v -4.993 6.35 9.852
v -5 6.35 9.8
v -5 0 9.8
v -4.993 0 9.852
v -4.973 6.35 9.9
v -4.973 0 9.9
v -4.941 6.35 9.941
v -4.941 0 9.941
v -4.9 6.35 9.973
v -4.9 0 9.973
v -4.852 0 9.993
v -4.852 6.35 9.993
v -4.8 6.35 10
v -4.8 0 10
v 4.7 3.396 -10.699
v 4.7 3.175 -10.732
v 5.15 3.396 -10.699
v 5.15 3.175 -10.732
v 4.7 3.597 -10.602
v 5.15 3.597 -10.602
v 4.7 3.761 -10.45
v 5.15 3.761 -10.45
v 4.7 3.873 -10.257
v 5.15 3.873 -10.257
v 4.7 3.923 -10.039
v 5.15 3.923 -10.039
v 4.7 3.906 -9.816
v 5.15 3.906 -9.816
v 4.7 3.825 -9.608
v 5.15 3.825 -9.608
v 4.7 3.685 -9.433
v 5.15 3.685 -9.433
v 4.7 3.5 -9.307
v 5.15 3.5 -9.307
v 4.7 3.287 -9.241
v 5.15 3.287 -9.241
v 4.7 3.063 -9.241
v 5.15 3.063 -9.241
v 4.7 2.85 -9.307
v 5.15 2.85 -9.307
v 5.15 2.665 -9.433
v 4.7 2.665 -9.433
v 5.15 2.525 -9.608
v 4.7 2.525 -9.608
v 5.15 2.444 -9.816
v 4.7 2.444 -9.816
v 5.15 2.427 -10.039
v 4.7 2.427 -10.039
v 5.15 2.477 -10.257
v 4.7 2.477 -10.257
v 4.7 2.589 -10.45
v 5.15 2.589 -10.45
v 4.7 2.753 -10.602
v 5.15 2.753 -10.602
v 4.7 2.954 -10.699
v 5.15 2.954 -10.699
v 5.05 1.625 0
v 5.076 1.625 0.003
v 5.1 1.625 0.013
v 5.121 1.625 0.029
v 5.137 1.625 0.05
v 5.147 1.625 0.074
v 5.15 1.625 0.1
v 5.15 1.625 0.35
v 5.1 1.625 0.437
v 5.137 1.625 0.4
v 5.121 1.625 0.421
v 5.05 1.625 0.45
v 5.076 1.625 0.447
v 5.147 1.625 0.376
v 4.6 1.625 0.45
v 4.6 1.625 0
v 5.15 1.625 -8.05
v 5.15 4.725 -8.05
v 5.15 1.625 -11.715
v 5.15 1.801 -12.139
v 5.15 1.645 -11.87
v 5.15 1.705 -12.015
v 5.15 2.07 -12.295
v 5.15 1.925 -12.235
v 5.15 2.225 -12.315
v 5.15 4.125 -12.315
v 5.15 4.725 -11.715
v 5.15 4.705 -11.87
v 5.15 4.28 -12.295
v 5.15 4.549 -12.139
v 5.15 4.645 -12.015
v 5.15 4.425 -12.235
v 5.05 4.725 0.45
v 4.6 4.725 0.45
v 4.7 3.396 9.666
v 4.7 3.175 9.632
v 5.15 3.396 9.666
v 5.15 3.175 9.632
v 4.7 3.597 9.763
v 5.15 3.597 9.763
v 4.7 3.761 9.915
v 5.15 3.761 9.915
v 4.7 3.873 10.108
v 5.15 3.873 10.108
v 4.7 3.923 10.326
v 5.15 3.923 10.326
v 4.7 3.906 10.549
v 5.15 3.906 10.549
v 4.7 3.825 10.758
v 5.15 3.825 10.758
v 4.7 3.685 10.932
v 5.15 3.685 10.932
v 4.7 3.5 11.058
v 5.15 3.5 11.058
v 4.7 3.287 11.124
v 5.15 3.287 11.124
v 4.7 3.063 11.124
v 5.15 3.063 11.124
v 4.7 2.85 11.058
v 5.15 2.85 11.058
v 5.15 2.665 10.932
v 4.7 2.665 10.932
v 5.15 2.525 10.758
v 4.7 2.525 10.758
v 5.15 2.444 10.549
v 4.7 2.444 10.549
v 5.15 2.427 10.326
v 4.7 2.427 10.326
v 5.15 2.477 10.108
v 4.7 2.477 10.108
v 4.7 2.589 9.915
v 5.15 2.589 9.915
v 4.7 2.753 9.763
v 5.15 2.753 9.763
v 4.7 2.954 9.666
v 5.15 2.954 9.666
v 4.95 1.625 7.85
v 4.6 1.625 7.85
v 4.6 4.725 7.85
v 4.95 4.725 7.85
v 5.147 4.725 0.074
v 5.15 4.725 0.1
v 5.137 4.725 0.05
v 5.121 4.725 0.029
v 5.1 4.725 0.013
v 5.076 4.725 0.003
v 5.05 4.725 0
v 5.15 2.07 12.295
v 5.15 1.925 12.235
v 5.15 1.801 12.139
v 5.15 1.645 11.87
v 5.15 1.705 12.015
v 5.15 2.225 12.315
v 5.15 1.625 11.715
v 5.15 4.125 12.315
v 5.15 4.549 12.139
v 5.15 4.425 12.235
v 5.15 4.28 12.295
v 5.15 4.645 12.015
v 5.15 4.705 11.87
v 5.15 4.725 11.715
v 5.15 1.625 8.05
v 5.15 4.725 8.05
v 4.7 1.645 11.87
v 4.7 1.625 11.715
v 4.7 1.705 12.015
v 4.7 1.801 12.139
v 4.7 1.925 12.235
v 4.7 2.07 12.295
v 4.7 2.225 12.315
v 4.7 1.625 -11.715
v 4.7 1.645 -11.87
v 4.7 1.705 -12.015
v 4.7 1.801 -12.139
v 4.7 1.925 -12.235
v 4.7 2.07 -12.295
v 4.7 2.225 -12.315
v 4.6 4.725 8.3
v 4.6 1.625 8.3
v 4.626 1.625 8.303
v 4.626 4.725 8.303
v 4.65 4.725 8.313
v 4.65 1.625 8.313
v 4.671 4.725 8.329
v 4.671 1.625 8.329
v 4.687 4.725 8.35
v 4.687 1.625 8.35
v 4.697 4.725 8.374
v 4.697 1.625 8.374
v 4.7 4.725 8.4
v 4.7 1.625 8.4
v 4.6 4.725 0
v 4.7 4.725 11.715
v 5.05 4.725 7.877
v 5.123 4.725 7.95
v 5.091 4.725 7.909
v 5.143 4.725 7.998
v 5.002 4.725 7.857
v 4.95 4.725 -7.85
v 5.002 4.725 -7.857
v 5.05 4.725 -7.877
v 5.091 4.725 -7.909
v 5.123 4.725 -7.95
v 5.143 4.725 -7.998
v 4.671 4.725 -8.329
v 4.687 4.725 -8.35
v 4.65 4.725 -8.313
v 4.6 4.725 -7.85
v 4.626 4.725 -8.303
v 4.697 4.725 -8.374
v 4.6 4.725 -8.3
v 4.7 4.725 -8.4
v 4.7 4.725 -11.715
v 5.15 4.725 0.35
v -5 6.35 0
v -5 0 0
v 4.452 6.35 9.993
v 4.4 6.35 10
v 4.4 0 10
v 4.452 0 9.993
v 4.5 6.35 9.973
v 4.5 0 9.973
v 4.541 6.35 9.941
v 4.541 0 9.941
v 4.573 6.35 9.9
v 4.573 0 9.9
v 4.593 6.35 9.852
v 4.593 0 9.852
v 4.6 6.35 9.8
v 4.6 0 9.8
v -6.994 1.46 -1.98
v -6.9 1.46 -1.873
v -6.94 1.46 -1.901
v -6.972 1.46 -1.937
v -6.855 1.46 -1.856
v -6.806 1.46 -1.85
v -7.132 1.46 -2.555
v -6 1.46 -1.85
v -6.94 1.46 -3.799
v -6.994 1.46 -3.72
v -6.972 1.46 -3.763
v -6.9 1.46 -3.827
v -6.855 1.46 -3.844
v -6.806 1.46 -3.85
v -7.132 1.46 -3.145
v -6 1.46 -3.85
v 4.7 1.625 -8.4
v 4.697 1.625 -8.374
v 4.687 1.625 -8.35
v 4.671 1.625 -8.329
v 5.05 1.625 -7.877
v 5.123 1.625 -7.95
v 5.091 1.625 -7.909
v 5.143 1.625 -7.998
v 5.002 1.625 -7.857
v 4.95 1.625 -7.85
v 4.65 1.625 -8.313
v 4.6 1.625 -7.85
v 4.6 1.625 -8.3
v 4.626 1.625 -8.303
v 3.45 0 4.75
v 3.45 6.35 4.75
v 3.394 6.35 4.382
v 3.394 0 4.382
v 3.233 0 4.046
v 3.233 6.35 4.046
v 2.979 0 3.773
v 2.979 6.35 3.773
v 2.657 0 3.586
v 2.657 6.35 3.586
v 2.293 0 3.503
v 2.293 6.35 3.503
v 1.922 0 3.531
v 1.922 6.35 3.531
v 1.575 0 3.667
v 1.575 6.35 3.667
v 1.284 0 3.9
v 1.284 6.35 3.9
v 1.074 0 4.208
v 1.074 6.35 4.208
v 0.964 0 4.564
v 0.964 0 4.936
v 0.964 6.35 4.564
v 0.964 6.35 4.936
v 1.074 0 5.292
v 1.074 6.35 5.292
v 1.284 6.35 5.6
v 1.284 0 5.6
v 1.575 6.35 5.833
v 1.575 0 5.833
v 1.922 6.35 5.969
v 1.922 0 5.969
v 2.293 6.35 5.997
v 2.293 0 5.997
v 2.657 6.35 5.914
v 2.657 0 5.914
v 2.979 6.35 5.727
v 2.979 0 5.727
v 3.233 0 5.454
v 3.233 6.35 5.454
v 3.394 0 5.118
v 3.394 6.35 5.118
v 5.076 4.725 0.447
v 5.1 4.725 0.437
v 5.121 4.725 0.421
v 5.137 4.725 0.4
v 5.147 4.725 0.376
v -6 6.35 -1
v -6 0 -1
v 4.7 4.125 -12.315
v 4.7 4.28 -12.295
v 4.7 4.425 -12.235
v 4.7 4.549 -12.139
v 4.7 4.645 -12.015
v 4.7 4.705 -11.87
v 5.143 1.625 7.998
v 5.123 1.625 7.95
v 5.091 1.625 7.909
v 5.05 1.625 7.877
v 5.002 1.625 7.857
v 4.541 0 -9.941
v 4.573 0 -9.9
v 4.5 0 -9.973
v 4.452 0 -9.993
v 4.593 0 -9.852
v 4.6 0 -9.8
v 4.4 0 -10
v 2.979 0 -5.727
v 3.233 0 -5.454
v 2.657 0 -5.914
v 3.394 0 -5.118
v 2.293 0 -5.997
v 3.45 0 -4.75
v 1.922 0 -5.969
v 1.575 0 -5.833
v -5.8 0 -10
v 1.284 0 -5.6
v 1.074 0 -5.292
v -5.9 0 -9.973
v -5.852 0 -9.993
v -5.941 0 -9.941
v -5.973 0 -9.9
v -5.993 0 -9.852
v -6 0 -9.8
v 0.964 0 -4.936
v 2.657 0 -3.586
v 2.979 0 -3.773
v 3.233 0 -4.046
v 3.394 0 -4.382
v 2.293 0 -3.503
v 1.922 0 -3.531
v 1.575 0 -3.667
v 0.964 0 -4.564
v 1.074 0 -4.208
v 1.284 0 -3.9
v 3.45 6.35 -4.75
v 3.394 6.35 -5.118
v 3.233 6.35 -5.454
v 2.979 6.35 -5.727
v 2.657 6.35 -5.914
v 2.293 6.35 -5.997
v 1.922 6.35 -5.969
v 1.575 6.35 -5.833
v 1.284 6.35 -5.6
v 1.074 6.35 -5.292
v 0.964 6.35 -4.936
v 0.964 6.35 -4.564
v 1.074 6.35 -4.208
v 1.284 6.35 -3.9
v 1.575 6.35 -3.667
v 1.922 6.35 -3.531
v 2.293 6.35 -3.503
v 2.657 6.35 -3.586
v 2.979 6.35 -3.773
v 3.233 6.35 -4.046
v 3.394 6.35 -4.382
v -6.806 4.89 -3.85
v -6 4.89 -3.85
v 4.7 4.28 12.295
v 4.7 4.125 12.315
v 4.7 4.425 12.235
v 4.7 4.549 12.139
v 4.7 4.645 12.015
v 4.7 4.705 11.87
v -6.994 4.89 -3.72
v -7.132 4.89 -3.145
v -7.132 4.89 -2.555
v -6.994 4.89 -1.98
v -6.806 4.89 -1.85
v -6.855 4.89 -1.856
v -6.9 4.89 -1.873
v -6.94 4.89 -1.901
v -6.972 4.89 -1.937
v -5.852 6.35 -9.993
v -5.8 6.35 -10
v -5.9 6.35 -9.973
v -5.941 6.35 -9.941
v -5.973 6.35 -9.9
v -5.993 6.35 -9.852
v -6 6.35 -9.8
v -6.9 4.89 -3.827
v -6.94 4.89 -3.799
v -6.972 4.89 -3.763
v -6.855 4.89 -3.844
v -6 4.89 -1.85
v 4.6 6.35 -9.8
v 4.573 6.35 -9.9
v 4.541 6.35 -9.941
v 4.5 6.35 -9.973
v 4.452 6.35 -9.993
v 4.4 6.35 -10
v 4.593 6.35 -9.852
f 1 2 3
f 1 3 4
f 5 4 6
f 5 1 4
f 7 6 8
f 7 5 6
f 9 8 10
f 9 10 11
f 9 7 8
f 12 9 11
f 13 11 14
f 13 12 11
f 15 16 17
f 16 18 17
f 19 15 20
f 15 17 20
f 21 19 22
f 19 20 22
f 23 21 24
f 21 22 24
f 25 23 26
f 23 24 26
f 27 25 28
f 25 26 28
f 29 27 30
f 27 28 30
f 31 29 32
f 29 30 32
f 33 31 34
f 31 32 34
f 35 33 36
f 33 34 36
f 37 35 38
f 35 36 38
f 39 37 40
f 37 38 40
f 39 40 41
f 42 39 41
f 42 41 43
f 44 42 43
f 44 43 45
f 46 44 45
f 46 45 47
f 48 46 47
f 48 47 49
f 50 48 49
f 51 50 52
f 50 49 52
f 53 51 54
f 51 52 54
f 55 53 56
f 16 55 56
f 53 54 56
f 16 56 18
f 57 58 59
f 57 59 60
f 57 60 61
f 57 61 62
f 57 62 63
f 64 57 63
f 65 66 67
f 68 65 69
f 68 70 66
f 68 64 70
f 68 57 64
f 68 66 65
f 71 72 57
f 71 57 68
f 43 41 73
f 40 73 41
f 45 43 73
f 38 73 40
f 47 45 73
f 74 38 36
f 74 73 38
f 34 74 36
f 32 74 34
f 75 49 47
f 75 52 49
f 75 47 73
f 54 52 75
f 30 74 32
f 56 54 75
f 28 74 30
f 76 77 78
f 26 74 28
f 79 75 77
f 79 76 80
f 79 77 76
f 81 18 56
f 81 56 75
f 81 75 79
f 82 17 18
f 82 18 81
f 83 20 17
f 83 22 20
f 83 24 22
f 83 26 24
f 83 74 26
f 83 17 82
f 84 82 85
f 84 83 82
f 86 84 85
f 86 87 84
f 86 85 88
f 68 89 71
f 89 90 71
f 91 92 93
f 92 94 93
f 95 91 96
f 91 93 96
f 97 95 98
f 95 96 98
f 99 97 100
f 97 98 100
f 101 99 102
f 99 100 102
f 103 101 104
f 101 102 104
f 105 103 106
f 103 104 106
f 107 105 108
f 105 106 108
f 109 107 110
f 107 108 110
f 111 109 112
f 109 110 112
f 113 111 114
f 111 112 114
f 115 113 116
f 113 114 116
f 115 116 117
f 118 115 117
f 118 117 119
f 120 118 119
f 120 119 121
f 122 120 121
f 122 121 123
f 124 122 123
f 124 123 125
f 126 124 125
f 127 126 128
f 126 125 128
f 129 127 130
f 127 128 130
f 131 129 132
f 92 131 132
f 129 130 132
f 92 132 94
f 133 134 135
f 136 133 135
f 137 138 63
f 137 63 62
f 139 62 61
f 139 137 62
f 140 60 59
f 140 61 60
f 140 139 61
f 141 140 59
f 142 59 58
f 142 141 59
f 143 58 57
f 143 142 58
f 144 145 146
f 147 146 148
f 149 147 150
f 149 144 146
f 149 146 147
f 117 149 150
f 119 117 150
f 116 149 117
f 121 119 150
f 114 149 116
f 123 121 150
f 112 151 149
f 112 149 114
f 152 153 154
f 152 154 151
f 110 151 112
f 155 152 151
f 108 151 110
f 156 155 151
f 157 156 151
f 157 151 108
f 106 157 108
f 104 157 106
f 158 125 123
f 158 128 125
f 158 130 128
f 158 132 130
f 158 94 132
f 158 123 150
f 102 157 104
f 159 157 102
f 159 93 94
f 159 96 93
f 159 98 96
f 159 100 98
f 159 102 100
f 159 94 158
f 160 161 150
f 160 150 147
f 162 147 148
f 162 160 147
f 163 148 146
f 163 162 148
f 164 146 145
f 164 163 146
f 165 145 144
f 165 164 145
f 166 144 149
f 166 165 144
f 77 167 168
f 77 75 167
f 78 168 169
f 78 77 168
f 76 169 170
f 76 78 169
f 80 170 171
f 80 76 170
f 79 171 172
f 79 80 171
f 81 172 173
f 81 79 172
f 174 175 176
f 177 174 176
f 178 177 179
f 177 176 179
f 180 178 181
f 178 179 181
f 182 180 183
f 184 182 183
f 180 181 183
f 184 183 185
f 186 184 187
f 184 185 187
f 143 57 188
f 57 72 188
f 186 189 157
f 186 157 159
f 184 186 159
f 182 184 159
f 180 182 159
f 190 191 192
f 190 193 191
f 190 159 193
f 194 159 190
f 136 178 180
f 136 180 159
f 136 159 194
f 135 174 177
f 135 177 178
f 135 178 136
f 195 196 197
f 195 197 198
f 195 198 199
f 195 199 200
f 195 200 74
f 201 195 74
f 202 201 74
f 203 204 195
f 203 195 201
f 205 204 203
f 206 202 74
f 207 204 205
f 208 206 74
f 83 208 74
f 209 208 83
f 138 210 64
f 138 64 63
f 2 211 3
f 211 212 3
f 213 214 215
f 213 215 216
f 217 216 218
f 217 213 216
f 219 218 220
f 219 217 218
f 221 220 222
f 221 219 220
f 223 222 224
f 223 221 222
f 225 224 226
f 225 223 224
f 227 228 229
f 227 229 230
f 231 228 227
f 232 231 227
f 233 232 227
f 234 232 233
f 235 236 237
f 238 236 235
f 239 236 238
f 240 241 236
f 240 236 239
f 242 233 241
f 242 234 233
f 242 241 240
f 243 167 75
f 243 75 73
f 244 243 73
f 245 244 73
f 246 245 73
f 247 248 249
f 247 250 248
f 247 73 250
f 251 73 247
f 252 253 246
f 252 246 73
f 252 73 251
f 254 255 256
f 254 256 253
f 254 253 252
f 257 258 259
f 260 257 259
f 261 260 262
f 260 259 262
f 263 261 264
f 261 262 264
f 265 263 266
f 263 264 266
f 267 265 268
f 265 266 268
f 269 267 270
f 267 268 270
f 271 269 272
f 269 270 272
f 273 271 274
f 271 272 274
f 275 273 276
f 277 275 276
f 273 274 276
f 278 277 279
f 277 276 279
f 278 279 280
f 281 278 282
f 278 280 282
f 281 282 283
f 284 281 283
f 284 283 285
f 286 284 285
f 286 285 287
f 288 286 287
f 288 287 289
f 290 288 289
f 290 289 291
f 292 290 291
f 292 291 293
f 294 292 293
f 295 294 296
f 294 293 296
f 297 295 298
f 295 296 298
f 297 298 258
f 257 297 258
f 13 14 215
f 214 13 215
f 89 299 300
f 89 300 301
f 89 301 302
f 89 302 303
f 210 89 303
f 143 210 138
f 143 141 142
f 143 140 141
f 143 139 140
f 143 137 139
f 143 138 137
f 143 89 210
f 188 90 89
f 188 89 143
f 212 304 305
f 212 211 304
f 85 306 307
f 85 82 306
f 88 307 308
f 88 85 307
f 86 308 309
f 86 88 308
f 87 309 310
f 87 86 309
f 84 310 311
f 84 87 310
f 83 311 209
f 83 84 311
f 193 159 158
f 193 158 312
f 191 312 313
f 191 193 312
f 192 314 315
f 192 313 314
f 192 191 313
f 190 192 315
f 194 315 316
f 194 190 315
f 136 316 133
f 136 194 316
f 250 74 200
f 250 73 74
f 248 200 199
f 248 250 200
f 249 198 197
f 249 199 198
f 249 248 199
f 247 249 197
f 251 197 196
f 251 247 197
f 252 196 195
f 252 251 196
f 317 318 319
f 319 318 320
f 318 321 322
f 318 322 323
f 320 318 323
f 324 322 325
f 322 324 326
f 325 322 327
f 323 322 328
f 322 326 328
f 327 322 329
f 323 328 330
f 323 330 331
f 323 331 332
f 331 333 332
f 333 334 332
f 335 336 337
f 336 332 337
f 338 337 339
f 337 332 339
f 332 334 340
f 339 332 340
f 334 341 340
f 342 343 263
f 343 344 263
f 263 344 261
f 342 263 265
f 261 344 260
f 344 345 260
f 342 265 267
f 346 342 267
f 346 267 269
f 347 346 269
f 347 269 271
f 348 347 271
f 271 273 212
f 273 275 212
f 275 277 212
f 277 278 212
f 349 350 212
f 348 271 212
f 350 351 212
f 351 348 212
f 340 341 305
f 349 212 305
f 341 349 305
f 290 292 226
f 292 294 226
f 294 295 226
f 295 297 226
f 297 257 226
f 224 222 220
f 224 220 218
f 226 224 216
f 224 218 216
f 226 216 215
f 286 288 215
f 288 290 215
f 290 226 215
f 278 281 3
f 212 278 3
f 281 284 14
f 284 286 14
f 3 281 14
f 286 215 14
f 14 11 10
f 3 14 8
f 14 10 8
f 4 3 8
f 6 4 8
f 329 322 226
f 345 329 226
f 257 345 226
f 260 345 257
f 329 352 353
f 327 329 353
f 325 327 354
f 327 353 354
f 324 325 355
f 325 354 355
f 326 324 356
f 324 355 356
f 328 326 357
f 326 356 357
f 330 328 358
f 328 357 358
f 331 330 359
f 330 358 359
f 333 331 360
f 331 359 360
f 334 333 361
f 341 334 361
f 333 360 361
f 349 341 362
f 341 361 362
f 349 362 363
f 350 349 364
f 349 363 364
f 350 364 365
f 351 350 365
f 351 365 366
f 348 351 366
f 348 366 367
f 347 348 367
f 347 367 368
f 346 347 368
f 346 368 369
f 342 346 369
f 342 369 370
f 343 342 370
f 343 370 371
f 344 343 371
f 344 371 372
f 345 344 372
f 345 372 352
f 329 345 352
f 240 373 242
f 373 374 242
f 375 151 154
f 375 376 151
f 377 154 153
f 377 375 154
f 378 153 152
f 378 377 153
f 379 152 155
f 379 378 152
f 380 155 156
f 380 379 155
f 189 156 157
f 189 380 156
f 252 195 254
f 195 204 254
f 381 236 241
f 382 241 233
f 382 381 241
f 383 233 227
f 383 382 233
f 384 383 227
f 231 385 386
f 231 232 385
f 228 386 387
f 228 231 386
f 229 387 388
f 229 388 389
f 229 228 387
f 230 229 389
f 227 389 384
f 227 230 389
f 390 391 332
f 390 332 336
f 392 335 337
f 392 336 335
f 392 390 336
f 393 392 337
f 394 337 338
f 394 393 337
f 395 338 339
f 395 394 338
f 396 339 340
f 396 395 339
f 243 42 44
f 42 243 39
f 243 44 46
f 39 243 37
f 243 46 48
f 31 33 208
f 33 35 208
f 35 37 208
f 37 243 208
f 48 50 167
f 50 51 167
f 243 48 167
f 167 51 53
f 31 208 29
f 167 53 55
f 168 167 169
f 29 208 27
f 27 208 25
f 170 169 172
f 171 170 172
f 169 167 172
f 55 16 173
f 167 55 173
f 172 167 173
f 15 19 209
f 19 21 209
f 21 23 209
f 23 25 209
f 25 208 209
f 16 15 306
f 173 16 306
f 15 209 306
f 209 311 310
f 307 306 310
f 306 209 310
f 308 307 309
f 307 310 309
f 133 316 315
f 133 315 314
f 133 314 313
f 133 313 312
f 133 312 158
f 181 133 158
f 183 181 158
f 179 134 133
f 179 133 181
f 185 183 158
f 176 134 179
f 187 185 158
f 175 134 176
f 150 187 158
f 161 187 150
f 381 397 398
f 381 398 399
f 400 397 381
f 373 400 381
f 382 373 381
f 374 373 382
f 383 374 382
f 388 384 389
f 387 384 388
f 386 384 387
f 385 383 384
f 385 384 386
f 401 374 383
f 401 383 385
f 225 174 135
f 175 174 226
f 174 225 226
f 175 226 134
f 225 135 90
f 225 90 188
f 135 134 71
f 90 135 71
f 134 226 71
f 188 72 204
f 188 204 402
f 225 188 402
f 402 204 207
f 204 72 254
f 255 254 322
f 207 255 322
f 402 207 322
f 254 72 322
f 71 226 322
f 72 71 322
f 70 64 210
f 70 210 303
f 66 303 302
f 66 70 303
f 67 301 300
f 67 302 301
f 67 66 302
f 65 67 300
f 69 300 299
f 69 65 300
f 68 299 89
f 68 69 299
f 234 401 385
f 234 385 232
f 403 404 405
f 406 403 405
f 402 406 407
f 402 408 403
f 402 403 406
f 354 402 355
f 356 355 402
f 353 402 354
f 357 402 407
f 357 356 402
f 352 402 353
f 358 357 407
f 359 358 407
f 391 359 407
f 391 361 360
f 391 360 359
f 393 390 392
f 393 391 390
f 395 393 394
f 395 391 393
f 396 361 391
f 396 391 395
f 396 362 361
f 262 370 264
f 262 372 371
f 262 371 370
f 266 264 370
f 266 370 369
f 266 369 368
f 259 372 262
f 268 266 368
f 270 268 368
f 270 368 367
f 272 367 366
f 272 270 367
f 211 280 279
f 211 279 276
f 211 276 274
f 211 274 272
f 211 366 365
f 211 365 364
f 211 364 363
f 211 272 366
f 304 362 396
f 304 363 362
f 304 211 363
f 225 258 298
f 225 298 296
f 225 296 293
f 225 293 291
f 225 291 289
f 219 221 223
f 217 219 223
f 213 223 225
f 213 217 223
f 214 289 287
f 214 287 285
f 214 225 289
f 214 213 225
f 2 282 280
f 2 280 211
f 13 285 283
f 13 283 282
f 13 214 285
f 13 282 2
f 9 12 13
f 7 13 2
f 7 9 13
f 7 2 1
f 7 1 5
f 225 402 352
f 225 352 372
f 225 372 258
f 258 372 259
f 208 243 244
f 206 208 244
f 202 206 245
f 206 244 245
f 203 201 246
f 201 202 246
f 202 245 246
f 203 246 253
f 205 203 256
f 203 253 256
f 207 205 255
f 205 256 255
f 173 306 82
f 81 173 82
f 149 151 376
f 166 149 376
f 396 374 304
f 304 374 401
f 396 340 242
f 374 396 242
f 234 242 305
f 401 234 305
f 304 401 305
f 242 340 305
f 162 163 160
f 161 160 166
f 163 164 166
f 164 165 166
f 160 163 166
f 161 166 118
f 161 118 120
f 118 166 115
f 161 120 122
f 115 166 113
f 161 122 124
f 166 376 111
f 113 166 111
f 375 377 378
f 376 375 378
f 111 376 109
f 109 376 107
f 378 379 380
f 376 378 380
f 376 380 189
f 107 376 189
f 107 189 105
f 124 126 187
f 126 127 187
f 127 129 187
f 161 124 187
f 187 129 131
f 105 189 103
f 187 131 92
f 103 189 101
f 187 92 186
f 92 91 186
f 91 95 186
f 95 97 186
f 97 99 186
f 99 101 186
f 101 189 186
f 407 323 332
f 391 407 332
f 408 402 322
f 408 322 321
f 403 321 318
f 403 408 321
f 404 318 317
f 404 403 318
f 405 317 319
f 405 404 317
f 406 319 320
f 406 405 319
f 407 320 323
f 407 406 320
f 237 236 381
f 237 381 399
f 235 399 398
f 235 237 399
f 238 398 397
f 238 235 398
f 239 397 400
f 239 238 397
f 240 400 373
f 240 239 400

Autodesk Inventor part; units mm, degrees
ref_plane "YZ Plane" through (0, 0, 0) normal (1, 0, 0) x (0, 1, 0)
ref_plane "XZ Plane" through (0, 0, 0) normal (0, 1, 0) x (-1, 0, 0)
ref_plane "XY Plane" through (0, 0, 0) normal (0, 0, 1) x (1, 0, 0)
sketch "Skizze1" plane through (0, 0, 0) normal (0, 1, 0) x (-1, 0, 0)
  line L0 (5, 10) -> (-5, 10)
  line L1 (-5, 10) -> (-5, -10)
  line L2 (-5, -10) -> (5, -10)
  line L3 (5, -10) -> (5, 10)
  line L4 (5, 10) -> (-5, -10) construction
  line L5 (-5, 10) -> (5, -10) construction
  line L6 (5, -10) -> (6, -10)
  line L7 (6, -10) -> (6, 0)
  line L8 (6, 0) -> (5, 0)
  line L9 (5, 0) -> (5, -10)
  point P0 (0, 0)
  dimension "d0" = 10
  dimension "d1" = 20
  dimension "d2" = 1
extrude "Extrusion1" add sketch "Skizze1" along normal blind 6.35
sketch "Skizze2" plane through (-6, 0, -10) normal (-1, 0, 0) x (0, 0, 1)
  line L0 (0, 0) -> (0, 6.35) projected
  line L1 (0, 0) -> (10, 0) projected
  line L2 (0, 6.35) -> (8.15, 6.35)
  line L3 (8.15, 6.35) -> (8.15, 0)
  line L4 (8.15, 0) -> (0, 0)
  line L5 (0, 0) -> (0, 6.35)
  line L6 (8.15, 6.35) -> (6.15, 6.35)
  line L7 (6.15, 6.35) -> (6.15, 0)
  line L8 (6.15, 0) -> (8.15, 0)
  line L9 (8.15, 0) -> (8.15, 6.35)
  line L10 (6.15, 4.89) -> (8.15, 4.89)
  line L11 (8.15, 4.89) -> (8.15, 1.46)
  line L12 (8.15, 1.46) -> (6.15, 1.46)
  line L13 (6.15, 1.46) -> (6.15, 4.89)
  line L14 (6.15, 4.89) -> (8.15, 1.46) construction
  line L15 (8.15, 4.89) -> (6.15, 1.46) construction
  point P0 (7.15, 3.175)
  point P1 (8.15, 1.46)
  dimension "d5" = 8.15
  dimension "d6" = 2
  dimension "d7" = 2
  dimension "d8" = 3.43
extrude "Extrusion2" add sketch "Skizze2" along normal blind 1.15 contours L7 L10 L3 L12
sketch "Skizze3" plane through (-6, 4.89, -1.85) normal (0, 1, 0) x (1, 0, 0)
  line L0 (0, 2) -> (0, 0) projected
  line L1 (0, 2) -> (-1.15, 2) projected
  line L2 (-1.15, 0) -> (-1.15, 2) projected
  line L3 (0, 0) -> (-1.15, 0) projected
  circle A0 centre (1.35, 1) radius 2.5
  point P0 (6, -1.85)
  point P1 (-1.15, 1)
  point P2 (-0.9413, 0)
  point P3 (-0.9413, 2)
  dimension "d11" = 5
extrude "Extrusion3" cut sketch "Skizze3" against normal through all contours A0 L2 L1 | L3 L2 A0
fillet "Rundung1" radius 0.2 2 edges at (-6.9413, 3.175, -1.85) (-6.9413, 3.175, -3.85)
chamfer "Fase1" distance 1 angle 45 1 edges at (-6, 3.175, 0)
fillet "Rundung2" radius 0.2 4 edges at (-5, 3.175, 10) (5, 3.175, 10) (5, 3.175, -10) (-6, 3.175, -10)
move faces "Verschieben1" translate (-0.4, 0, 0) faces at (4.8149, 2.1167, 9.9994) (4.936, 2.1167, -9.9466) (5, 2.1167, 3.2667)
sketch "Skizze4" plane through (4.6, 0, 9.8) normal (1, 0, 0) x (0, 0, -1)
  line L0 (19.6, 6.35) -> (19.6, 0) projected
  line L1 (0, 6.35) -> (19.6, 6.35) projected
  line L2 (0, 0) -> (0, 6.35) projected
  line L3 (0, 0) -> (19.6, 0) projected
  line L4 (1.95, 4.725) -> (17.65, 4.725)
  line L5 (17.65, 4.725) -> (17.65, 1.625)
  line L6 (17.65, 1.625) -> (1.95, 1.625)
  line L7 (1.95, 1.625) -> (1.95, 4.725)
  line L8 (9.8, 0) -> (9.8, 6.35) projected
  line L9 (1.95, 4.725) -> (17.65, 1.625) construction
  line L10 (17.65, 4.725) -> (1.95, 1.625) construction
  line L11 (1.5, 4.725) -> (18.1, 4.725)
  line L12 (18.1, 4.725) -> (18.1, 1.625)
  line L13 (18.1, 1.625) -> (1.5, 1.625)
  line L14 (1.5, 1.625) -> (1.5, 4.725)
  line L15 (1.5, 4.725) -> (18.1, 1.625) construction
  line L16 (18.1, 4.725) -> (1.5, 1.625) construction
  line L17 (9.8, 4.725) -> (9.35, 4.725)
  line L18 (9.35, 4.725) -> (9.35, 1.625)
  line L19 (9.35, 1.625) -> (9.8, 1.625)
  line L20 (9.8, 1.625) -> (9.8, 4.725)
  point P0 (9.8, 3.175)
  point P1 (9.8, 3.175)
  point P2 (17.65, 4.725)
  point P3 (17.65, 1.625)
  point P4 (9.35, 4.725)
  point P5 (9.8, 1.625)
  point P6 (9.8, 4.725)
  point P7 (1.95, 1.625)
  point P8 (1.95, 4.725)
  dimension "d22" = 15.7
  dimension "d23" = 3.1
  dimension "d24" = 16.6
  dimension "d25" = 0.45
extrude "Extrusion4" add sketch "Skizze4" along normal blind 0.55 contours L8 L6 L18 L4 | L11 L12 L13 L5 | L7 L13 L14 L11
sketch "Skizze5" plane through (4.6, 4.725, 8.3) normal (0, 1, 0) x (1, 0, 0)
  line L0 (0, 0) -> (0, 0.45) projected
  line L1 (0, 0) -> (0.55, 0) projected
  line L2 (0.55, 0.45) -> (0.55, 0) projected
  line L3 (0, 0.45) -> (0.55, 0.45) projected
  line L4 (0, 16.15) -> (0, 16.6) projected
  line L5 (0, 16.15) -> (0.55, 16.15) projected
  line L6 (0.55, 16.6) -> (0.55, 16.15) projected
  line L7 (0, 16.6) -> (0.55, 16.6) projected
  line L8 (1, -4.015) -> (0.1, -4.015)
  line L9 (0.1, -4.015) -> (0.1, 20.615)
  line L10 (0.1, 20.615) -> (1, 20.615)
  line L11 (1, 20.615) -> (1, -4.015)
  line L12 (0.55, 7.85) -> (0.55, 8.3) projected
  line L13 (1, -4.015) -> (0.1, 20.615) construction
  line L14 (0.1, -4.015) -> (1, 20.615) construction
  line L15 (0.55, 20.615) -> (0.55, -4.015)
  point P0 (-4.6, 8.3)
  point P1 (0.1, 16.6)
  point P2 (0.1, 0)
  dimension "d28" = 0.9
  dimension "d29" = 24.63
extrude "Extrusion5" add sketch "Skizze5" against normal up to surface (3.1 mm away) contours L1 L15 L8 L9 | L9 L10 L15 L7
fillet "Rundung3" radius 0.2 2 edges at (5.15, 3.175, -7.85) (5.15, 3.175, 7.85)
fillet "Rundung4" radius 0.1 2 edges at (4.7, 3.175, -8.3) (4.7, 3.175, 8.3)
fillet "Rundung5" radius 0.1 2 edges at (5.15, 3.175, 0.45) (5.15, 3.175, 0)
sketch "Skizze6" plane through (5.15, 0, 9.8) normal (1, 0, 0) x (0, 0, -1)
  line L0 (1.75, 4.725) -> (1.75, 1.625) projected
  line L1 (1.75, 4.725) -> (-2.515, 4.725) projected
  line L2 (-2.515, 4.725) -> (-2.515, 1.625) projected
  line L3 (-2.515, 1.625) -> (1.75, 1.625) projected
  line L4 (17.85, 1.625) -> (17.85, 4.725) projected
  line L5 (17.85, 1.625) -> (22.115, 1.625) projected
  line L6 (22.115, 4.725) -> (22.115, 1.625) projected
  line L7 (17.85, 4.725) -> (22.115, 4.725) projected
  circle A0 centre (-0.5825, 3.175) radius 0.75
  circle A1 centre (19.7825, 3.175) radius 0.75
  point P0 (9.8, 0)
  dimension "d35" = 1.5
  dimension "d36" = 1.5
extrude "Extrusion6" cut sketch "Skizze6" against normal up to surface (0.45 mm away) contours A0 | A1
sketch "Skizze7" plane through (0, 6.35, 0) normal (0, 1, 0) x (1, 0, 0)
  line L0 (3.45, 6) -> (0.95, 6)
  line L1 (0.95, 6) -> (0.95, -6)
  line L2 (0.95, -6) -> (3.45, -6)
  line L3 (3.45, -6) -> (3.45, 6)
  line L4 (3.45, 6) -> (0.95, -6) construction
  line L5 (0.95, 6) -> (3.45, -6) construction
  line L6 (3.45, 3.5) -> (0.95, 3.5)
  line L7 (0.95, 3.5) -> (0.95, -3.5)
  line L8 (0.95, -3.5) -> (3.45, -3.5)
  line L9 (3.45, -3.5) -> (3.45, 3.5)
  line L10 (3.45, 3.5) -> (0.95, -3.5) construction
  line L11 (0.95, 3.5) -> (3.45, -3.5) construction
  circle A0 centre (2.2, 4.75) radius 1.25
  circle A1 centre (2.2, -4.75) radius 1.25
  arc A2 (4.95, 7.85) -> (5.15, 8.05) centre (4.95, 8.05) ccw projected
  line L12 (5.15, 8.05) -> (5.15, 12.315) projected
  line L13 (5.15, 12.315) -> (4.7, 12.315) projected
  line L14 (4.7, 12.315) -> (4.7, 8.4) projected
  arc A3 (4.6, 8.3) -> (4.7, 8.4) centre (4.6, 8.4) ccw projected
  line L15 (4.6, 7.85) -> (4.6, 8.3) projected
  line L16 (4.6, 7.85) -> (4.95, 7.85) projected
  arc A4 (5.15, -8.05) -> (4.95, -7.85) centre (4.95, -8.05) ccw projected
  line L17 (4.6, -7.85) -> (4.95, -7.85) projected
  line L18 (4.6, -8.3) -> (4.6, -7.85) projected
  arc A5 (4.7, -8.4) -> (4.6, -8.3) centre (4.6, -8.4) ccw projected
  line L19 (4.7, -8.4) -> (4.7, -12.315) projected
  line L20 (4.7, -12.315) -> (5.15, -12.315) projected
  line L21 (5.15, -8.05) -> (5.15, -12.315) projected
  point P0 (0, 0)
  point P1 (2.2, 0)
  point P2 (2.2, 0)
  point P3 (2.2, 3.5)
  point P4 (2.2, 6)
  point P5 (2.2, 0)
  dimension "d39" = 2.5
  dimension "d40" = 12
  dimension "d41" = 2.5
  dimension "d42" = 7
  dimension "d43" = 1.7
  dimension "d44" = 24.63
  dimension "d45" = 12.315
  dimension "d46" = 2.95
extrude "Extrusion7" cut sketch "Skizze7" against normal through all contours A0 | A1
fillet "Rundung6" radius 0.6 4 edges at (4.925, 4.725, 12.315) (4.925, 1.625, 12.315) (4.925, 4.725, -12.315) (4.925, 1.625, -12.315)
equation "\"d45\" = 0.5 * d44"
properties part number "Glicky_3D"
